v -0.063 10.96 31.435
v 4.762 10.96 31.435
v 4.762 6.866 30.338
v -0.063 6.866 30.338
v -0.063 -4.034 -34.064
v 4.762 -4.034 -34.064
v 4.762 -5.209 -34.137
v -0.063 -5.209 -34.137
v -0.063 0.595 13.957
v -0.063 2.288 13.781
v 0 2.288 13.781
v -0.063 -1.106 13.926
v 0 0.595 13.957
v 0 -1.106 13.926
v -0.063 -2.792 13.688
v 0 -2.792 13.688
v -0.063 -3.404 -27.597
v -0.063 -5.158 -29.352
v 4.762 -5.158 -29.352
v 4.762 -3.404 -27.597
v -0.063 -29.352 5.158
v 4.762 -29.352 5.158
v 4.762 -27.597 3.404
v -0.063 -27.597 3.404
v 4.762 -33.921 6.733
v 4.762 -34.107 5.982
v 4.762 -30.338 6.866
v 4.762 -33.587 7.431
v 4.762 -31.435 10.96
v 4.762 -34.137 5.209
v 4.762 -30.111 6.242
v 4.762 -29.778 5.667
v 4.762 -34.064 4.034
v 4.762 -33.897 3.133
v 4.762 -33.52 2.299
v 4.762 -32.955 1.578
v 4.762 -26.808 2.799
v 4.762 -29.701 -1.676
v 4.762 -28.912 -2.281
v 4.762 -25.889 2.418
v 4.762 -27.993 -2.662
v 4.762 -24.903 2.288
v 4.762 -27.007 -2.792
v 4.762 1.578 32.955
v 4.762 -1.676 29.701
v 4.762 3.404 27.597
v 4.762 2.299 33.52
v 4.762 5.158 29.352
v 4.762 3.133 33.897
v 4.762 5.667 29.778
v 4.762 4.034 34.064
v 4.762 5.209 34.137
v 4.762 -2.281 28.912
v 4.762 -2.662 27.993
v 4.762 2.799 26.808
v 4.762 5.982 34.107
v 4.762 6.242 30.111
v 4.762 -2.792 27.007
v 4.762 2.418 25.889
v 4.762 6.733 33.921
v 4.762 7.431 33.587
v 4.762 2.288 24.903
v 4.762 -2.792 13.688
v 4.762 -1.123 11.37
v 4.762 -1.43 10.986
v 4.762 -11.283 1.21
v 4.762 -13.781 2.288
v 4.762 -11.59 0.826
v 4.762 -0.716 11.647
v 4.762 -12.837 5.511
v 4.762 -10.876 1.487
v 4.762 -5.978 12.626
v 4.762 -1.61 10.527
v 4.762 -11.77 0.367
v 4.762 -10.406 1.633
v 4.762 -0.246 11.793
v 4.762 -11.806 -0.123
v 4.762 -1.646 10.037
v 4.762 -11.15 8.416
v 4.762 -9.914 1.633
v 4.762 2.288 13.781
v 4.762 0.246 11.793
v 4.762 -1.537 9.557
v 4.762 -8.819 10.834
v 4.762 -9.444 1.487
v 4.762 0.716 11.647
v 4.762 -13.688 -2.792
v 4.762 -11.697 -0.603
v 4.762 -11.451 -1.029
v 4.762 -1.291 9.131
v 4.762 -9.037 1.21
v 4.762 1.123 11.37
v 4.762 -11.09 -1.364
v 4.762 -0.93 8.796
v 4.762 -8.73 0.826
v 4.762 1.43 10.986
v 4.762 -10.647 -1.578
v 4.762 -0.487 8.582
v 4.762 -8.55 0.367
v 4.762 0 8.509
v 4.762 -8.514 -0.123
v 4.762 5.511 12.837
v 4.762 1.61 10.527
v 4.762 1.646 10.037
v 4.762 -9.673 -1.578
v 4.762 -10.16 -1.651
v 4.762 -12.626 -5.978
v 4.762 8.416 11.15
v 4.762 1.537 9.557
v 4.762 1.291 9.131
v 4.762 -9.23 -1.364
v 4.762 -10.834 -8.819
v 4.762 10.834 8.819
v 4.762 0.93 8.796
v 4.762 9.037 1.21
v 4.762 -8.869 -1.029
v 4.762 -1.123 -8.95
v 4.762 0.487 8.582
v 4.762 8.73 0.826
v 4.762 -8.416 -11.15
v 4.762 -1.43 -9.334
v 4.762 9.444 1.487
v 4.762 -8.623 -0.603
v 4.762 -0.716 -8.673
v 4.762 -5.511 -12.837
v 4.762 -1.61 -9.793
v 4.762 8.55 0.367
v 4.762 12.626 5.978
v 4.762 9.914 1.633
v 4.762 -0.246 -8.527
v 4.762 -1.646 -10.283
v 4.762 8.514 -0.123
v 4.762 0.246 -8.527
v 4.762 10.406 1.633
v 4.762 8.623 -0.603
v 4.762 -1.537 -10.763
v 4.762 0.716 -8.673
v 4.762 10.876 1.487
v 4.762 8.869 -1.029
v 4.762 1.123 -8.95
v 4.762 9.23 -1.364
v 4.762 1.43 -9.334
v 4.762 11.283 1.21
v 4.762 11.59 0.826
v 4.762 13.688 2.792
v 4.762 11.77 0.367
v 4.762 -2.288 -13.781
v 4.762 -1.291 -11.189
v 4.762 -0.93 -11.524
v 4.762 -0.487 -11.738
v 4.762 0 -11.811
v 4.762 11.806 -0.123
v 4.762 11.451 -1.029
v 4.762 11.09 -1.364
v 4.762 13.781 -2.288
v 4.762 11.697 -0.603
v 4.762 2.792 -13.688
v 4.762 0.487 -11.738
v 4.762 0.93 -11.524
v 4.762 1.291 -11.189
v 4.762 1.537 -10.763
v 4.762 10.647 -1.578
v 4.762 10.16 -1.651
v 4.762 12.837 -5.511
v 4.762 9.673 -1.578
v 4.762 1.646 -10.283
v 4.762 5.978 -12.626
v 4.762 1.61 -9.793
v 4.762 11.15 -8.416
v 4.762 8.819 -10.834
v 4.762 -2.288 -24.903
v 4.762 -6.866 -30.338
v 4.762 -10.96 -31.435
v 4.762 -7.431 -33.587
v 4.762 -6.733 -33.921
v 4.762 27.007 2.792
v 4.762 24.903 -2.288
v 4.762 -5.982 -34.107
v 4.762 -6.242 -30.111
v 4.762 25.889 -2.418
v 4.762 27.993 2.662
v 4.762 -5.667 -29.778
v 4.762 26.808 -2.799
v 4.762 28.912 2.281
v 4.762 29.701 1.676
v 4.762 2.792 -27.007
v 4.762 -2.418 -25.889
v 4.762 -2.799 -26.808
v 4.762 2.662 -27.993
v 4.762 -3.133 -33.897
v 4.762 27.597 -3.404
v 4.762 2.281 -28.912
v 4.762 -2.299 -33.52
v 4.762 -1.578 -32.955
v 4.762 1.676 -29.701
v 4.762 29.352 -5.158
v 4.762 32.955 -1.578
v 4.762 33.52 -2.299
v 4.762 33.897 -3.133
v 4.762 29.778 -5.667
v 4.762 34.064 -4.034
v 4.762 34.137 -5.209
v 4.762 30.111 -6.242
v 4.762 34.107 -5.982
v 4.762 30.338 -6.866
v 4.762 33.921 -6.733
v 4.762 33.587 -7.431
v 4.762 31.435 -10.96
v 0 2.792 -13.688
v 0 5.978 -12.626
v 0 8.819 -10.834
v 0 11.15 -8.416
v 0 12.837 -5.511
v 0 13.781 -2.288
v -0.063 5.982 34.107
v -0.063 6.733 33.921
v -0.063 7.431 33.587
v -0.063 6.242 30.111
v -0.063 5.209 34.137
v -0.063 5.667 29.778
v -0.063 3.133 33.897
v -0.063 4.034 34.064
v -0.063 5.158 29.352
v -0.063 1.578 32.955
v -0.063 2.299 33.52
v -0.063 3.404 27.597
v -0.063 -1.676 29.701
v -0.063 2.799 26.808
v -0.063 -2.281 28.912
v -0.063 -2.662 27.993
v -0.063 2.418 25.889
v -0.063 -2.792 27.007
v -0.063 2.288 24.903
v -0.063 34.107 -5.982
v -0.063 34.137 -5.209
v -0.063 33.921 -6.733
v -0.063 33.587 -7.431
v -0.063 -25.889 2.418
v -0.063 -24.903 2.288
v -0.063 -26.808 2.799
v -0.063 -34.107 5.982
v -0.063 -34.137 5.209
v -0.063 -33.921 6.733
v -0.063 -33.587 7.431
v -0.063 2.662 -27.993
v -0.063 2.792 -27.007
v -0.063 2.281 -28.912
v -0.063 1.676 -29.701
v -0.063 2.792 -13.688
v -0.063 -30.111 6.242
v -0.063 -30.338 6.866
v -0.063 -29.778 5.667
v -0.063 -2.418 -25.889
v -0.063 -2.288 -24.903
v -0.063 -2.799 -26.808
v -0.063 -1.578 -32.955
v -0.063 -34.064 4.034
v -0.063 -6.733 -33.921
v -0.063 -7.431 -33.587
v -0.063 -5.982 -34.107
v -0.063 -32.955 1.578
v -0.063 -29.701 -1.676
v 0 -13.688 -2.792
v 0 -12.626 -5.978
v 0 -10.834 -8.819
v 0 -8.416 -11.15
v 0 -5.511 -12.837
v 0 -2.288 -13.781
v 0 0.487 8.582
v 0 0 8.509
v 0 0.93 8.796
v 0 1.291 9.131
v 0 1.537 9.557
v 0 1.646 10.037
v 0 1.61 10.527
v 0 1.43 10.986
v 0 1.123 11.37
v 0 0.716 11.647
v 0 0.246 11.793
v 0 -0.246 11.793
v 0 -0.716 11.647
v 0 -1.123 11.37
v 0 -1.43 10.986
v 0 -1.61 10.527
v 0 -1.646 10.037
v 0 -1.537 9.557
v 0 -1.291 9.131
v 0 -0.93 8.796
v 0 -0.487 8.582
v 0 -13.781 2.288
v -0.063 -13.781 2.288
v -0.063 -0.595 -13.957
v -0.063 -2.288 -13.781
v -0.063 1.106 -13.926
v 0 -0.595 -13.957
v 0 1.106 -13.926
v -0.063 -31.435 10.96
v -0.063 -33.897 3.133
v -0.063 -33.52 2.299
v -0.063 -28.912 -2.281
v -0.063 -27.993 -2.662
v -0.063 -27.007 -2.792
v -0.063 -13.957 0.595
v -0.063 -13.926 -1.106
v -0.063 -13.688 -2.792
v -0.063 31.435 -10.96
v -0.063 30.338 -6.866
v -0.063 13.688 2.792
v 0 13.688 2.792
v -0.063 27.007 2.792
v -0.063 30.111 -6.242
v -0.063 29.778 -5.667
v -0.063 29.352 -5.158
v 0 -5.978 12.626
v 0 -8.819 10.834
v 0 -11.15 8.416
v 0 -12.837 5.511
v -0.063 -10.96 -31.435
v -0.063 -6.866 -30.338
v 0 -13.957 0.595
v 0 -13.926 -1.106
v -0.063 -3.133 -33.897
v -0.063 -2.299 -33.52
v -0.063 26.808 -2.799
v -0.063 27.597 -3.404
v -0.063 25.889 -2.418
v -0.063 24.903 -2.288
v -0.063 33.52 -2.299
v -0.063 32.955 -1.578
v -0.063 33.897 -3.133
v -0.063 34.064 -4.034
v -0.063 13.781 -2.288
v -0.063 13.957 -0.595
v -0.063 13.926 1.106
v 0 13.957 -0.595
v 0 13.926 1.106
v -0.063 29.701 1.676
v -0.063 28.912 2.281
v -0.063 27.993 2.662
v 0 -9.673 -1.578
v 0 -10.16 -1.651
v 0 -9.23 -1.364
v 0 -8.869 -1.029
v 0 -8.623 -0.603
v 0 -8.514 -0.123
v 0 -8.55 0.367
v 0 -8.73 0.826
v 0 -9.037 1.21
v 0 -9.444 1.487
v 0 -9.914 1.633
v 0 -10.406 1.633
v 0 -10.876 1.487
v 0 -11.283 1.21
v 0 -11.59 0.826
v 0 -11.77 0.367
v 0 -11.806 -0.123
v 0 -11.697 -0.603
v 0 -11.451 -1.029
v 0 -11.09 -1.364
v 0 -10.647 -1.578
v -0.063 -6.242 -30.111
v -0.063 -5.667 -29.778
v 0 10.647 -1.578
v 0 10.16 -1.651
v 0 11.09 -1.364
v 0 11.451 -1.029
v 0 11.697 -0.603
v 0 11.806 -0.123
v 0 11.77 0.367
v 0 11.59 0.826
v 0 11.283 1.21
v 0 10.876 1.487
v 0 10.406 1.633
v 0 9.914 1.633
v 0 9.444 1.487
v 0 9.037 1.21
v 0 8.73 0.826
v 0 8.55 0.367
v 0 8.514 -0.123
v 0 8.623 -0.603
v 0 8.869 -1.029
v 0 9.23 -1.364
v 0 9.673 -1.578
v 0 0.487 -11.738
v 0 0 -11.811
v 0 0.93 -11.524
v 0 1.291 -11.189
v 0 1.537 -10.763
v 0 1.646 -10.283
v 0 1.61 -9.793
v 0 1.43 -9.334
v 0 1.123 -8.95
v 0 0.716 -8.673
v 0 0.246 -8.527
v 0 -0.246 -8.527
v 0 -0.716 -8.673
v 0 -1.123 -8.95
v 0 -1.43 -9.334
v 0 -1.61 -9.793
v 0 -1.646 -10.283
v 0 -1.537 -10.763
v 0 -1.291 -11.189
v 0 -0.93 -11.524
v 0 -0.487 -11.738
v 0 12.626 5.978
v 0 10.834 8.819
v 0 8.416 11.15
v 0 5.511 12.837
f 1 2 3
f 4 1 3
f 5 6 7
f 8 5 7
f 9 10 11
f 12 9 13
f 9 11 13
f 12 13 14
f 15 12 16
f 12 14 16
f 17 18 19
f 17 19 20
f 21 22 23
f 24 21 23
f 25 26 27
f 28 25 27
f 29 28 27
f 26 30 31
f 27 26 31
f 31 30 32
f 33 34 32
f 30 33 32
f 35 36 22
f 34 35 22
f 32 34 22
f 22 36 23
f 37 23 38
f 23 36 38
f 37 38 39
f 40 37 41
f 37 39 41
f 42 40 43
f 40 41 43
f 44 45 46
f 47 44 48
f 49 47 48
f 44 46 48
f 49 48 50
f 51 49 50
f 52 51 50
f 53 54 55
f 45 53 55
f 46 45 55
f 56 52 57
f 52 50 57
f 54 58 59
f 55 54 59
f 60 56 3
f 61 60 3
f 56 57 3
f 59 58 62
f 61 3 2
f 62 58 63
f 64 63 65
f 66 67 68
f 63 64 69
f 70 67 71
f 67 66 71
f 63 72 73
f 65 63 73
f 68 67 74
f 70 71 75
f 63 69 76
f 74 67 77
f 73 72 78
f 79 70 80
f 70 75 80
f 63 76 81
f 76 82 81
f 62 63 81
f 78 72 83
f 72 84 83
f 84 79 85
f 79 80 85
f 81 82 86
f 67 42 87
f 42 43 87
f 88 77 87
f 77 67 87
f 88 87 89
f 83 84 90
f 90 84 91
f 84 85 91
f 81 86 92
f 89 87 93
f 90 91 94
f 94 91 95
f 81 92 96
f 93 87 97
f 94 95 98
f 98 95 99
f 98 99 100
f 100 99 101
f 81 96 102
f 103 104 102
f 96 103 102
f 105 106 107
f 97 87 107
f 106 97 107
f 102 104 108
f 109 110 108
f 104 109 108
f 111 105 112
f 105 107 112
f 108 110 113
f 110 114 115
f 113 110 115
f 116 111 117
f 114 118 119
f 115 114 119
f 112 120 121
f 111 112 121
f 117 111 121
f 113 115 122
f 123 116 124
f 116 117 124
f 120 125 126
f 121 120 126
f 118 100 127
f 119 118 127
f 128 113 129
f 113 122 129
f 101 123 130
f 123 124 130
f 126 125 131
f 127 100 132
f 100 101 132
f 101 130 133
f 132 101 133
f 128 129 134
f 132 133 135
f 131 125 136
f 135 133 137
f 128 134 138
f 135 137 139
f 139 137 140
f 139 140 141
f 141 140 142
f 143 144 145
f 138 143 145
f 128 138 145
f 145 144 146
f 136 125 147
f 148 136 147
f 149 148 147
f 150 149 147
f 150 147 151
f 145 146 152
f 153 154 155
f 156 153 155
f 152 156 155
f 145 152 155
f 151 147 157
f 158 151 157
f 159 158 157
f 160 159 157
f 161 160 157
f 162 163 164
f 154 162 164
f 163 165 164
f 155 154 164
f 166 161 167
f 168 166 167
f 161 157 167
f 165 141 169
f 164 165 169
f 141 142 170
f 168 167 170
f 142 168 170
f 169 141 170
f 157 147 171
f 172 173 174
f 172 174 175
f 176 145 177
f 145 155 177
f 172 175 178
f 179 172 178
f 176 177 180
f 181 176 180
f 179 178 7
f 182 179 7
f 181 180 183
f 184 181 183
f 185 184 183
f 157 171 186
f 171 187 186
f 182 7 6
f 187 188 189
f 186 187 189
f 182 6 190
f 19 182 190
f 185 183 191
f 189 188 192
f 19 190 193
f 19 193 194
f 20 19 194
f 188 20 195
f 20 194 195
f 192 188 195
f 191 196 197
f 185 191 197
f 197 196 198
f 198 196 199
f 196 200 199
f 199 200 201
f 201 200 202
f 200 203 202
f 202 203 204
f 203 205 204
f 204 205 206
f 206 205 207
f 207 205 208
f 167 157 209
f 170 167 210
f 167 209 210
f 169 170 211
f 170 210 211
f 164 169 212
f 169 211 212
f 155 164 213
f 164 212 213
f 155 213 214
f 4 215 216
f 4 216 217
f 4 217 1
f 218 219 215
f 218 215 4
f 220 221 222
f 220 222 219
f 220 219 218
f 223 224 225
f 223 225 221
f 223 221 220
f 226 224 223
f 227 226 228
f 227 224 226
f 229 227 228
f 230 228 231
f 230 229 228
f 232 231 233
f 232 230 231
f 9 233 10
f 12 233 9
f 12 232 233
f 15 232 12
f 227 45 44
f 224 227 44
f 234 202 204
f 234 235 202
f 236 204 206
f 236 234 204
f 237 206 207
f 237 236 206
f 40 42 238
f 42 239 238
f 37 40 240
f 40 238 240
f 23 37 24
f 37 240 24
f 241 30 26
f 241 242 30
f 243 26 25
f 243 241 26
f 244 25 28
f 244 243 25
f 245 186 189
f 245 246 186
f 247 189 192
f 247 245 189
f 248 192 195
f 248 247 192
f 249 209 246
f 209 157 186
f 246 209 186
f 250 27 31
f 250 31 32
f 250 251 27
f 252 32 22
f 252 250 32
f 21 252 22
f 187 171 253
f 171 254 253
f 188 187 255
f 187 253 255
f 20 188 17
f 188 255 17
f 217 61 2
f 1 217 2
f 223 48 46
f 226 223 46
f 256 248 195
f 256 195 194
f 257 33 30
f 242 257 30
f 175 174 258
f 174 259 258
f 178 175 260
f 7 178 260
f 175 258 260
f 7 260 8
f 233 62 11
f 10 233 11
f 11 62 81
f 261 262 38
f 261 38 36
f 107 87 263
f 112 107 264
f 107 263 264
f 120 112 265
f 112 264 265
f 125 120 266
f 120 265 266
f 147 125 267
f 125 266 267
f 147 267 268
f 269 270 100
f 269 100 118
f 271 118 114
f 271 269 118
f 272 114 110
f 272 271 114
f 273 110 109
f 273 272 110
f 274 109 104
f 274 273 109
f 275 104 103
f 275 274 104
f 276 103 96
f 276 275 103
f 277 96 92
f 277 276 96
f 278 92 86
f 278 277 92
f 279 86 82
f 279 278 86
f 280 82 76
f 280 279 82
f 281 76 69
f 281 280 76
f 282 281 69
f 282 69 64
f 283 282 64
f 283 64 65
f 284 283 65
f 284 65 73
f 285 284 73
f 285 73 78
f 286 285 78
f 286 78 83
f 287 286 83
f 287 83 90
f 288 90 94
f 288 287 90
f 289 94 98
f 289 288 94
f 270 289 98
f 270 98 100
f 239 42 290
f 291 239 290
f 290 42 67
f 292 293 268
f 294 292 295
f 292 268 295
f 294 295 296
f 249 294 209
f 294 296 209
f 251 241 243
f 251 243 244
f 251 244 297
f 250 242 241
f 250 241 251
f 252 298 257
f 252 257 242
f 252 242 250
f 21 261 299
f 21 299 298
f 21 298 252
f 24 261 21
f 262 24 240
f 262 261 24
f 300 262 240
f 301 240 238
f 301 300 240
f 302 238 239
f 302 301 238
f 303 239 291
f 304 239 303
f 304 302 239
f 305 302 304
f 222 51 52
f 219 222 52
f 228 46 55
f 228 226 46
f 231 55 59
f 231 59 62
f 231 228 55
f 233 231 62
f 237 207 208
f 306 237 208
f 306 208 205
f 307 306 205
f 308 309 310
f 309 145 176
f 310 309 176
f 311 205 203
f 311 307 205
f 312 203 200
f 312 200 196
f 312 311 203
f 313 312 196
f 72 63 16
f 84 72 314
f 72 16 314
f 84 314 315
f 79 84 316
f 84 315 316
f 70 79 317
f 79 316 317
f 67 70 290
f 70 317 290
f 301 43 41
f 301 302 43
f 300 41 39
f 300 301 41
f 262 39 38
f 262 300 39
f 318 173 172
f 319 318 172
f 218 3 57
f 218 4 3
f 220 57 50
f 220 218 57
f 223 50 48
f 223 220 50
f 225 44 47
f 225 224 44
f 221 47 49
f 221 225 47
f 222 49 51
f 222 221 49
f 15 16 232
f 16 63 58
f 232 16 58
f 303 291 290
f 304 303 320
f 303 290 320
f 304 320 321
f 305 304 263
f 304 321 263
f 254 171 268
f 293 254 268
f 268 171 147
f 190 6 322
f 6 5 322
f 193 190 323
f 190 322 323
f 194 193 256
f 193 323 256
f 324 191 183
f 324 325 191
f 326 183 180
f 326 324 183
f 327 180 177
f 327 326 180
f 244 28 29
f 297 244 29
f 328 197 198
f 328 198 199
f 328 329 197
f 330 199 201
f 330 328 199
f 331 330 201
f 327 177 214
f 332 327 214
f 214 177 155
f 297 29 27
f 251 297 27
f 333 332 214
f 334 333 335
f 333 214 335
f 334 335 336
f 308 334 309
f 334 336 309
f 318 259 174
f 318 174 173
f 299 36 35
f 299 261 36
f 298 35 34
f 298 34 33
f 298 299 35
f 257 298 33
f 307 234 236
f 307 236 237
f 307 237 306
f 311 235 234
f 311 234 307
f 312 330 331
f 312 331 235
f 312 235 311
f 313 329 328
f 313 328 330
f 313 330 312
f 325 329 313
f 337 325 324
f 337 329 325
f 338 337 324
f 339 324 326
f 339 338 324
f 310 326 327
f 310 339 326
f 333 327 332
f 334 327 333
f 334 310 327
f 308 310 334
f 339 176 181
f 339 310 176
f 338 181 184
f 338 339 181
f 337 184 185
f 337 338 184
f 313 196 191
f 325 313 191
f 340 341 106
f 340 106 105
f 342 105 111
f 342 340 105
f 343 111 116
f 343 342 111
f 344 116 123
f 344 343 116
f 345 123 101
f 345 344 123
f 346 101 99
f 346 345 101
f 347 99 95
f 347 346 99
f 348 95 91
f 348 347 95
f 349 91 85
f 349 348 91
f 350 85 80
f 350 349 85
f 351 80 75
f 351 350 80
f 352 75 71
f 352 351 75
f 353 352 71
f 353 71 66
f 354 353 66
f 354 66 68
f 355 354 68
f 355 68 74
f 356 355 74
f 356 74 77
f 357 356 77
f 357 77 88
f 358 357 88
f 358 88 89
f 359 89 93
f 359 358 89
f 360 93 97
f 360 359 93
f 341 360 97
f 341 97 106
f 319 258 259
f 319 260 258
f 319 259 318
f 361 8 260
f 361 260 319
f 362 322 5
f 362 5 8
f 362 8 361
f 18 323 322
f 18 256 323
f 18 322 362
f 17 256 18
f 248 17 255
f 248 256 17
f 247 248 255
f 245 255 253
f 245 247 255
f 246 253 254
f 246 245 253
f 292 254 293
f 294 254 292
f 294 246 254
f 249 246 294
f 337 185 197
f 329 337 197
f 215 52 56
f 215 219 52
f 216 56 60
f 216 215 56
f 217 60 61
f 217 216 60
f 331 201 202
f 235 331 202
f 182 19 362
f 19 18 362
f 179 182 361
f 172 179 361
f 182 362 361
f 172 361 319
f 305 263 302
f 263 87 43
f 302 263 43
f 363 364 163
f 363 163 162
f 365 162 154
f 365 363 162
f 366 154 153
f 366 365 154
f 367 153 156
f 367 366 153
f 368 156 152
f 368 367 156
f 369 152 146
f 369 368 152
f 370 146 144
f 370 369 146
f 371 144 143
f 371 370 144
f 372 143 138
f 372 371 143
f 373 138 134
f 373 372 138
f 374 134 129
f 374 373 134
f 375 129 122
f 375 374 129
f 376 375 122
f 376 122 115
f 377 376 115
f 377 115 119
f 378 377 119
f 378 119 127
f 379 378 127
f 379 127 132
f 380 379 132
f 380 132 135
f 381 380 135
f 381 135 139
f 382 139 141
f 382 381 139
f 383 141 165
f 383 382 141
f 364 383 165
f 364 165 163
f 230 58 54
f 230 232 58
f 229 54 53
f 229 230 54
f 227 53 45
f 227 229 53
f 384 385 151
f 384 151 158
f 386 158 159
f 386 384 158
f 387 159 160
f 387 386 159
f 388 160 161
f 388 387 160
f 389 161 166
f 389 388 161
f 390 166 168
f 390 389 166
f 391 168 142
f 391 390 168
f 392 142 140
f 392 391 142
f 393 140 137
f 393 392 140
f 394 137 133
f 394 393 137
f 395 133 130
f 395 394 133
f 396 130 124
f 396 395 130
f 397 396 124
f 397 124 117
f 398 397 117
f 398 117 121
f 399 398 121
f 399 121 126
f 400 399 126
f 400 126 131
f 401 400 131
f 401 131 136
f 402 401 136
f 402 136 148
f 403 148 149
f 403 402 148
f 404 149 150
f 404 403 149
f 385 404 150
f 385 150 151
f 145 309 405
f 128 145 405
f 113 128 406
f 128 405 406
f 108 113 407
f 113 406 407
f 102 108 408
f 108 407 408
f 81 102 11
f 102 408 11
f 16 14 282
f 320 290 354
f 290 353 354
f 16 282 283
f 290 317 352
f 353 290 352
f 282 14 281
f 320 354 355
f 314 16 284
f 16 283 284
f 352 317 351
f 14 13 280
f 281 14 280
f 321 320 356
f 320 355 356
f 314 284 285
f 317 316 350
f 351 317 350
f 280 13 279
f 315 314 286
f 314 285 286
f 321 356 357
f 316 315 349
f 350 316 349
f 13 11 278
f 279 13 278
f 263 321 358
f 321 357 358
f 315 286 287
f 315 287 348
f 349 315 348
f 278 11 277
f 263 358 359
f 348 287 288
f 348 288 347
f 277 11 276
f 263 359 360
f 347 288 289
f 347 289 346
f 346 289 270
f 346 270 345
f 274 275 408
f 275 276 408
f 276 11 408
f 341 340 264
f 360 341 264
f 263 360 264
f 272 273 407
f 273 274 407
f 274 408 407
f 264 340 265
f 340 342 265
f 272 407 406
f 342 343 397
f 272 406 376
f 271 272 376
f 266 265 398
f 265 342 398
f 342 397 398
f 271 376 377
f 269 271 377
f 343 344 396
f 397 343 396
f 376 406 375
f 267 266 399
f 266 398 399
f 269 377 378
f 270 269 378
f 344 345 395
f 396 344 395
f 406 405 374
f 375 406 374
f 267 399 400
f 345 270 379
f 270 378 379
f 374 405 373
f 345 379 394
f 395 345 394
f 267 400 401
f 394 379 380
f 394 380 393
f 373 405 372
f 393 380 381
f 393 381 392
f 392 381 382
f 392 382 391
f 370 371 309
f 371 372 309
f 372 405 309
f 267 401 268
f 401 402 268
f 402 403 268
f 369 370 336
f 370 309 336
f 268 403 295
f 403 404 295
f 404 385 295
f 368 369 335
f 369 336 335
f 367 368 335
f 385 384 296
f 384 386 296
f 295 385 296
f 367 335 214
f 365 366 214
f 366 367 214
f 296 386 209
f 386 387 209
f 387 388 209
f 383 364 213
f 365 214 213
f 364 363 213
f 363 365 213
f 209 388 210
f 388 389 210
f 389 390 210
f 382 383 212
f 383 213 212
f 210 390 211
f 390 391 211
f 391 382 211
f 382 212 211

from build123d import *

# Parameters (mm, degrees)
SKETCH1_R                = 13.97
SKETCH1_R_2              = 1.651
BOSS_EXTRUDE1_DEPTH      = 4.7625
LEG1_DEPTH               = 4.826
FILLET2_R                = 3.81
CIRPATTERN1_COUNT        = 4
FILLET2_OF_CIRPATTERN1_R = 3.81


with BuildPart() as part:
    # Sketch1 → Boss-Extrude1 (new body)
    with BuildSketch(Plane(origin=(0, 0, 0), x_dir=(0, 0, -1), z_dir=(1, 0, 0))):
        Circle(SKETCH1_R)
        with Locations((-10.16, 0)):
            Circle(SKETCH1_R_2, mode=Mode.SUBTRACT)
        with Locations((0, 10.16)):
            Circle(SKETCH1_R_2, mode=Mode.SUBTRACT)
        with Locations((10.16, 0)):
            Circle(SKETCH1_R_2, mode=Mode.SUBTRACT)
        with Locations((0, -10.16)):
            Circle(SKETCH1_R_2, mode=Mode.SUBTRACT)
    extrude(amount=BOSS_EXTRUDE1_DEPTH)

    # Sketch2 → leg1 (add)
    with BuildSketch(Plane(origin=(4.7625, 0, 0), x_dir=(0, 0, -1), z_dir=(1, 0, 0))):
        with BuildLine():
            Line((13.688198848, 2.791793742), (28.585533284, 2.791793742))
            Line((28.585533284, 2.791793742), (33.973686957, -2.596359931))
            Line((33.973686957, -2.596359931), (34.21186075, -6.406359931))
            Line((34.21186075, -6.406359931), (31.434612733, -10.960308707))
            Line((31.434612733, -10.960308707), (30.073430836, -5.880308707))
            Line((30.073430836, -5.880308707), (26.481328387, -2.288206258))
            Line((26.481328387, -2.288206258), (13.781328387, -2.288206258))
            ThreePointArc((13.781328387, -2.288206258), (13.967653047, 0.256063207), (13.688198848, 2.791793742))
        make_face()
    leg1 = extrude(amount=-LEG1_DEPTH)

    # Fillet2
    fillet2_edges = [part.edges().sort_by_distance(p)[0] for p in [
        (2.3495, 2.791793742, -28.585533284),
        (2.3495, -2.596359931, -33.973686957),
        (2.3495, -6.406359931, -34.21186075),
        (2.3495, -5.880308707, -30.073430836),
        (2.3495, -2.288206258, -26.481328387),
    ]]
    fillet(fillet2_edges, radius=FILLET2_R)

    # CirPattern1: leg1 ×4 about axis
    cirpattern1_axis = Axis((0, 0, 0), (1, 0, 0))
    for i in range(1, CIRPATTERN1_COUNT):
        add(leg1.rotate(cirpattern1_axis, i * 360 / CIRPATTERN1_COUNT))

    # Fillet2 of CirPattern1
    fillet2_of_cirpattern1_edges = [part.edges().sort_by_distance(p)[0] for p in [
        (2.3495, 28.585533284, 2.791793742),
        (2.3495, 33.973686957, -2.596359931),
        (2.3495, 34.21186075, -6.406359931),
        (2.3495, 30.073430836, -5.880308707),
        (2.3495, 26.481328387, -2.288206258),
        (2.3495, -2.791793742, 28.585533284),
        (2.3495, 2.596359931, 33.973686957),
        (2.3495, 6.406359931, 34.21186075),
        (2.3495, 5.880308707, 30.073430836),
        (2.3495, 2.288206258, 26.481328387),
        (2.3495, -28.585533284, -2.791793742),
        (2.3495, -33.973686957, 2.596359931),
        (2.3495, -34.21186075, 6.406359931),
        (2.3495, -30.073430836, 5.880308707),
        (2.3495, -26.481328387, 2.288206258),
    ]]
    fillet(fillet2_of_cirpattern1_edges, radius=FILLET2_OF_CIRPATTERN1_R)


solid = part.part
